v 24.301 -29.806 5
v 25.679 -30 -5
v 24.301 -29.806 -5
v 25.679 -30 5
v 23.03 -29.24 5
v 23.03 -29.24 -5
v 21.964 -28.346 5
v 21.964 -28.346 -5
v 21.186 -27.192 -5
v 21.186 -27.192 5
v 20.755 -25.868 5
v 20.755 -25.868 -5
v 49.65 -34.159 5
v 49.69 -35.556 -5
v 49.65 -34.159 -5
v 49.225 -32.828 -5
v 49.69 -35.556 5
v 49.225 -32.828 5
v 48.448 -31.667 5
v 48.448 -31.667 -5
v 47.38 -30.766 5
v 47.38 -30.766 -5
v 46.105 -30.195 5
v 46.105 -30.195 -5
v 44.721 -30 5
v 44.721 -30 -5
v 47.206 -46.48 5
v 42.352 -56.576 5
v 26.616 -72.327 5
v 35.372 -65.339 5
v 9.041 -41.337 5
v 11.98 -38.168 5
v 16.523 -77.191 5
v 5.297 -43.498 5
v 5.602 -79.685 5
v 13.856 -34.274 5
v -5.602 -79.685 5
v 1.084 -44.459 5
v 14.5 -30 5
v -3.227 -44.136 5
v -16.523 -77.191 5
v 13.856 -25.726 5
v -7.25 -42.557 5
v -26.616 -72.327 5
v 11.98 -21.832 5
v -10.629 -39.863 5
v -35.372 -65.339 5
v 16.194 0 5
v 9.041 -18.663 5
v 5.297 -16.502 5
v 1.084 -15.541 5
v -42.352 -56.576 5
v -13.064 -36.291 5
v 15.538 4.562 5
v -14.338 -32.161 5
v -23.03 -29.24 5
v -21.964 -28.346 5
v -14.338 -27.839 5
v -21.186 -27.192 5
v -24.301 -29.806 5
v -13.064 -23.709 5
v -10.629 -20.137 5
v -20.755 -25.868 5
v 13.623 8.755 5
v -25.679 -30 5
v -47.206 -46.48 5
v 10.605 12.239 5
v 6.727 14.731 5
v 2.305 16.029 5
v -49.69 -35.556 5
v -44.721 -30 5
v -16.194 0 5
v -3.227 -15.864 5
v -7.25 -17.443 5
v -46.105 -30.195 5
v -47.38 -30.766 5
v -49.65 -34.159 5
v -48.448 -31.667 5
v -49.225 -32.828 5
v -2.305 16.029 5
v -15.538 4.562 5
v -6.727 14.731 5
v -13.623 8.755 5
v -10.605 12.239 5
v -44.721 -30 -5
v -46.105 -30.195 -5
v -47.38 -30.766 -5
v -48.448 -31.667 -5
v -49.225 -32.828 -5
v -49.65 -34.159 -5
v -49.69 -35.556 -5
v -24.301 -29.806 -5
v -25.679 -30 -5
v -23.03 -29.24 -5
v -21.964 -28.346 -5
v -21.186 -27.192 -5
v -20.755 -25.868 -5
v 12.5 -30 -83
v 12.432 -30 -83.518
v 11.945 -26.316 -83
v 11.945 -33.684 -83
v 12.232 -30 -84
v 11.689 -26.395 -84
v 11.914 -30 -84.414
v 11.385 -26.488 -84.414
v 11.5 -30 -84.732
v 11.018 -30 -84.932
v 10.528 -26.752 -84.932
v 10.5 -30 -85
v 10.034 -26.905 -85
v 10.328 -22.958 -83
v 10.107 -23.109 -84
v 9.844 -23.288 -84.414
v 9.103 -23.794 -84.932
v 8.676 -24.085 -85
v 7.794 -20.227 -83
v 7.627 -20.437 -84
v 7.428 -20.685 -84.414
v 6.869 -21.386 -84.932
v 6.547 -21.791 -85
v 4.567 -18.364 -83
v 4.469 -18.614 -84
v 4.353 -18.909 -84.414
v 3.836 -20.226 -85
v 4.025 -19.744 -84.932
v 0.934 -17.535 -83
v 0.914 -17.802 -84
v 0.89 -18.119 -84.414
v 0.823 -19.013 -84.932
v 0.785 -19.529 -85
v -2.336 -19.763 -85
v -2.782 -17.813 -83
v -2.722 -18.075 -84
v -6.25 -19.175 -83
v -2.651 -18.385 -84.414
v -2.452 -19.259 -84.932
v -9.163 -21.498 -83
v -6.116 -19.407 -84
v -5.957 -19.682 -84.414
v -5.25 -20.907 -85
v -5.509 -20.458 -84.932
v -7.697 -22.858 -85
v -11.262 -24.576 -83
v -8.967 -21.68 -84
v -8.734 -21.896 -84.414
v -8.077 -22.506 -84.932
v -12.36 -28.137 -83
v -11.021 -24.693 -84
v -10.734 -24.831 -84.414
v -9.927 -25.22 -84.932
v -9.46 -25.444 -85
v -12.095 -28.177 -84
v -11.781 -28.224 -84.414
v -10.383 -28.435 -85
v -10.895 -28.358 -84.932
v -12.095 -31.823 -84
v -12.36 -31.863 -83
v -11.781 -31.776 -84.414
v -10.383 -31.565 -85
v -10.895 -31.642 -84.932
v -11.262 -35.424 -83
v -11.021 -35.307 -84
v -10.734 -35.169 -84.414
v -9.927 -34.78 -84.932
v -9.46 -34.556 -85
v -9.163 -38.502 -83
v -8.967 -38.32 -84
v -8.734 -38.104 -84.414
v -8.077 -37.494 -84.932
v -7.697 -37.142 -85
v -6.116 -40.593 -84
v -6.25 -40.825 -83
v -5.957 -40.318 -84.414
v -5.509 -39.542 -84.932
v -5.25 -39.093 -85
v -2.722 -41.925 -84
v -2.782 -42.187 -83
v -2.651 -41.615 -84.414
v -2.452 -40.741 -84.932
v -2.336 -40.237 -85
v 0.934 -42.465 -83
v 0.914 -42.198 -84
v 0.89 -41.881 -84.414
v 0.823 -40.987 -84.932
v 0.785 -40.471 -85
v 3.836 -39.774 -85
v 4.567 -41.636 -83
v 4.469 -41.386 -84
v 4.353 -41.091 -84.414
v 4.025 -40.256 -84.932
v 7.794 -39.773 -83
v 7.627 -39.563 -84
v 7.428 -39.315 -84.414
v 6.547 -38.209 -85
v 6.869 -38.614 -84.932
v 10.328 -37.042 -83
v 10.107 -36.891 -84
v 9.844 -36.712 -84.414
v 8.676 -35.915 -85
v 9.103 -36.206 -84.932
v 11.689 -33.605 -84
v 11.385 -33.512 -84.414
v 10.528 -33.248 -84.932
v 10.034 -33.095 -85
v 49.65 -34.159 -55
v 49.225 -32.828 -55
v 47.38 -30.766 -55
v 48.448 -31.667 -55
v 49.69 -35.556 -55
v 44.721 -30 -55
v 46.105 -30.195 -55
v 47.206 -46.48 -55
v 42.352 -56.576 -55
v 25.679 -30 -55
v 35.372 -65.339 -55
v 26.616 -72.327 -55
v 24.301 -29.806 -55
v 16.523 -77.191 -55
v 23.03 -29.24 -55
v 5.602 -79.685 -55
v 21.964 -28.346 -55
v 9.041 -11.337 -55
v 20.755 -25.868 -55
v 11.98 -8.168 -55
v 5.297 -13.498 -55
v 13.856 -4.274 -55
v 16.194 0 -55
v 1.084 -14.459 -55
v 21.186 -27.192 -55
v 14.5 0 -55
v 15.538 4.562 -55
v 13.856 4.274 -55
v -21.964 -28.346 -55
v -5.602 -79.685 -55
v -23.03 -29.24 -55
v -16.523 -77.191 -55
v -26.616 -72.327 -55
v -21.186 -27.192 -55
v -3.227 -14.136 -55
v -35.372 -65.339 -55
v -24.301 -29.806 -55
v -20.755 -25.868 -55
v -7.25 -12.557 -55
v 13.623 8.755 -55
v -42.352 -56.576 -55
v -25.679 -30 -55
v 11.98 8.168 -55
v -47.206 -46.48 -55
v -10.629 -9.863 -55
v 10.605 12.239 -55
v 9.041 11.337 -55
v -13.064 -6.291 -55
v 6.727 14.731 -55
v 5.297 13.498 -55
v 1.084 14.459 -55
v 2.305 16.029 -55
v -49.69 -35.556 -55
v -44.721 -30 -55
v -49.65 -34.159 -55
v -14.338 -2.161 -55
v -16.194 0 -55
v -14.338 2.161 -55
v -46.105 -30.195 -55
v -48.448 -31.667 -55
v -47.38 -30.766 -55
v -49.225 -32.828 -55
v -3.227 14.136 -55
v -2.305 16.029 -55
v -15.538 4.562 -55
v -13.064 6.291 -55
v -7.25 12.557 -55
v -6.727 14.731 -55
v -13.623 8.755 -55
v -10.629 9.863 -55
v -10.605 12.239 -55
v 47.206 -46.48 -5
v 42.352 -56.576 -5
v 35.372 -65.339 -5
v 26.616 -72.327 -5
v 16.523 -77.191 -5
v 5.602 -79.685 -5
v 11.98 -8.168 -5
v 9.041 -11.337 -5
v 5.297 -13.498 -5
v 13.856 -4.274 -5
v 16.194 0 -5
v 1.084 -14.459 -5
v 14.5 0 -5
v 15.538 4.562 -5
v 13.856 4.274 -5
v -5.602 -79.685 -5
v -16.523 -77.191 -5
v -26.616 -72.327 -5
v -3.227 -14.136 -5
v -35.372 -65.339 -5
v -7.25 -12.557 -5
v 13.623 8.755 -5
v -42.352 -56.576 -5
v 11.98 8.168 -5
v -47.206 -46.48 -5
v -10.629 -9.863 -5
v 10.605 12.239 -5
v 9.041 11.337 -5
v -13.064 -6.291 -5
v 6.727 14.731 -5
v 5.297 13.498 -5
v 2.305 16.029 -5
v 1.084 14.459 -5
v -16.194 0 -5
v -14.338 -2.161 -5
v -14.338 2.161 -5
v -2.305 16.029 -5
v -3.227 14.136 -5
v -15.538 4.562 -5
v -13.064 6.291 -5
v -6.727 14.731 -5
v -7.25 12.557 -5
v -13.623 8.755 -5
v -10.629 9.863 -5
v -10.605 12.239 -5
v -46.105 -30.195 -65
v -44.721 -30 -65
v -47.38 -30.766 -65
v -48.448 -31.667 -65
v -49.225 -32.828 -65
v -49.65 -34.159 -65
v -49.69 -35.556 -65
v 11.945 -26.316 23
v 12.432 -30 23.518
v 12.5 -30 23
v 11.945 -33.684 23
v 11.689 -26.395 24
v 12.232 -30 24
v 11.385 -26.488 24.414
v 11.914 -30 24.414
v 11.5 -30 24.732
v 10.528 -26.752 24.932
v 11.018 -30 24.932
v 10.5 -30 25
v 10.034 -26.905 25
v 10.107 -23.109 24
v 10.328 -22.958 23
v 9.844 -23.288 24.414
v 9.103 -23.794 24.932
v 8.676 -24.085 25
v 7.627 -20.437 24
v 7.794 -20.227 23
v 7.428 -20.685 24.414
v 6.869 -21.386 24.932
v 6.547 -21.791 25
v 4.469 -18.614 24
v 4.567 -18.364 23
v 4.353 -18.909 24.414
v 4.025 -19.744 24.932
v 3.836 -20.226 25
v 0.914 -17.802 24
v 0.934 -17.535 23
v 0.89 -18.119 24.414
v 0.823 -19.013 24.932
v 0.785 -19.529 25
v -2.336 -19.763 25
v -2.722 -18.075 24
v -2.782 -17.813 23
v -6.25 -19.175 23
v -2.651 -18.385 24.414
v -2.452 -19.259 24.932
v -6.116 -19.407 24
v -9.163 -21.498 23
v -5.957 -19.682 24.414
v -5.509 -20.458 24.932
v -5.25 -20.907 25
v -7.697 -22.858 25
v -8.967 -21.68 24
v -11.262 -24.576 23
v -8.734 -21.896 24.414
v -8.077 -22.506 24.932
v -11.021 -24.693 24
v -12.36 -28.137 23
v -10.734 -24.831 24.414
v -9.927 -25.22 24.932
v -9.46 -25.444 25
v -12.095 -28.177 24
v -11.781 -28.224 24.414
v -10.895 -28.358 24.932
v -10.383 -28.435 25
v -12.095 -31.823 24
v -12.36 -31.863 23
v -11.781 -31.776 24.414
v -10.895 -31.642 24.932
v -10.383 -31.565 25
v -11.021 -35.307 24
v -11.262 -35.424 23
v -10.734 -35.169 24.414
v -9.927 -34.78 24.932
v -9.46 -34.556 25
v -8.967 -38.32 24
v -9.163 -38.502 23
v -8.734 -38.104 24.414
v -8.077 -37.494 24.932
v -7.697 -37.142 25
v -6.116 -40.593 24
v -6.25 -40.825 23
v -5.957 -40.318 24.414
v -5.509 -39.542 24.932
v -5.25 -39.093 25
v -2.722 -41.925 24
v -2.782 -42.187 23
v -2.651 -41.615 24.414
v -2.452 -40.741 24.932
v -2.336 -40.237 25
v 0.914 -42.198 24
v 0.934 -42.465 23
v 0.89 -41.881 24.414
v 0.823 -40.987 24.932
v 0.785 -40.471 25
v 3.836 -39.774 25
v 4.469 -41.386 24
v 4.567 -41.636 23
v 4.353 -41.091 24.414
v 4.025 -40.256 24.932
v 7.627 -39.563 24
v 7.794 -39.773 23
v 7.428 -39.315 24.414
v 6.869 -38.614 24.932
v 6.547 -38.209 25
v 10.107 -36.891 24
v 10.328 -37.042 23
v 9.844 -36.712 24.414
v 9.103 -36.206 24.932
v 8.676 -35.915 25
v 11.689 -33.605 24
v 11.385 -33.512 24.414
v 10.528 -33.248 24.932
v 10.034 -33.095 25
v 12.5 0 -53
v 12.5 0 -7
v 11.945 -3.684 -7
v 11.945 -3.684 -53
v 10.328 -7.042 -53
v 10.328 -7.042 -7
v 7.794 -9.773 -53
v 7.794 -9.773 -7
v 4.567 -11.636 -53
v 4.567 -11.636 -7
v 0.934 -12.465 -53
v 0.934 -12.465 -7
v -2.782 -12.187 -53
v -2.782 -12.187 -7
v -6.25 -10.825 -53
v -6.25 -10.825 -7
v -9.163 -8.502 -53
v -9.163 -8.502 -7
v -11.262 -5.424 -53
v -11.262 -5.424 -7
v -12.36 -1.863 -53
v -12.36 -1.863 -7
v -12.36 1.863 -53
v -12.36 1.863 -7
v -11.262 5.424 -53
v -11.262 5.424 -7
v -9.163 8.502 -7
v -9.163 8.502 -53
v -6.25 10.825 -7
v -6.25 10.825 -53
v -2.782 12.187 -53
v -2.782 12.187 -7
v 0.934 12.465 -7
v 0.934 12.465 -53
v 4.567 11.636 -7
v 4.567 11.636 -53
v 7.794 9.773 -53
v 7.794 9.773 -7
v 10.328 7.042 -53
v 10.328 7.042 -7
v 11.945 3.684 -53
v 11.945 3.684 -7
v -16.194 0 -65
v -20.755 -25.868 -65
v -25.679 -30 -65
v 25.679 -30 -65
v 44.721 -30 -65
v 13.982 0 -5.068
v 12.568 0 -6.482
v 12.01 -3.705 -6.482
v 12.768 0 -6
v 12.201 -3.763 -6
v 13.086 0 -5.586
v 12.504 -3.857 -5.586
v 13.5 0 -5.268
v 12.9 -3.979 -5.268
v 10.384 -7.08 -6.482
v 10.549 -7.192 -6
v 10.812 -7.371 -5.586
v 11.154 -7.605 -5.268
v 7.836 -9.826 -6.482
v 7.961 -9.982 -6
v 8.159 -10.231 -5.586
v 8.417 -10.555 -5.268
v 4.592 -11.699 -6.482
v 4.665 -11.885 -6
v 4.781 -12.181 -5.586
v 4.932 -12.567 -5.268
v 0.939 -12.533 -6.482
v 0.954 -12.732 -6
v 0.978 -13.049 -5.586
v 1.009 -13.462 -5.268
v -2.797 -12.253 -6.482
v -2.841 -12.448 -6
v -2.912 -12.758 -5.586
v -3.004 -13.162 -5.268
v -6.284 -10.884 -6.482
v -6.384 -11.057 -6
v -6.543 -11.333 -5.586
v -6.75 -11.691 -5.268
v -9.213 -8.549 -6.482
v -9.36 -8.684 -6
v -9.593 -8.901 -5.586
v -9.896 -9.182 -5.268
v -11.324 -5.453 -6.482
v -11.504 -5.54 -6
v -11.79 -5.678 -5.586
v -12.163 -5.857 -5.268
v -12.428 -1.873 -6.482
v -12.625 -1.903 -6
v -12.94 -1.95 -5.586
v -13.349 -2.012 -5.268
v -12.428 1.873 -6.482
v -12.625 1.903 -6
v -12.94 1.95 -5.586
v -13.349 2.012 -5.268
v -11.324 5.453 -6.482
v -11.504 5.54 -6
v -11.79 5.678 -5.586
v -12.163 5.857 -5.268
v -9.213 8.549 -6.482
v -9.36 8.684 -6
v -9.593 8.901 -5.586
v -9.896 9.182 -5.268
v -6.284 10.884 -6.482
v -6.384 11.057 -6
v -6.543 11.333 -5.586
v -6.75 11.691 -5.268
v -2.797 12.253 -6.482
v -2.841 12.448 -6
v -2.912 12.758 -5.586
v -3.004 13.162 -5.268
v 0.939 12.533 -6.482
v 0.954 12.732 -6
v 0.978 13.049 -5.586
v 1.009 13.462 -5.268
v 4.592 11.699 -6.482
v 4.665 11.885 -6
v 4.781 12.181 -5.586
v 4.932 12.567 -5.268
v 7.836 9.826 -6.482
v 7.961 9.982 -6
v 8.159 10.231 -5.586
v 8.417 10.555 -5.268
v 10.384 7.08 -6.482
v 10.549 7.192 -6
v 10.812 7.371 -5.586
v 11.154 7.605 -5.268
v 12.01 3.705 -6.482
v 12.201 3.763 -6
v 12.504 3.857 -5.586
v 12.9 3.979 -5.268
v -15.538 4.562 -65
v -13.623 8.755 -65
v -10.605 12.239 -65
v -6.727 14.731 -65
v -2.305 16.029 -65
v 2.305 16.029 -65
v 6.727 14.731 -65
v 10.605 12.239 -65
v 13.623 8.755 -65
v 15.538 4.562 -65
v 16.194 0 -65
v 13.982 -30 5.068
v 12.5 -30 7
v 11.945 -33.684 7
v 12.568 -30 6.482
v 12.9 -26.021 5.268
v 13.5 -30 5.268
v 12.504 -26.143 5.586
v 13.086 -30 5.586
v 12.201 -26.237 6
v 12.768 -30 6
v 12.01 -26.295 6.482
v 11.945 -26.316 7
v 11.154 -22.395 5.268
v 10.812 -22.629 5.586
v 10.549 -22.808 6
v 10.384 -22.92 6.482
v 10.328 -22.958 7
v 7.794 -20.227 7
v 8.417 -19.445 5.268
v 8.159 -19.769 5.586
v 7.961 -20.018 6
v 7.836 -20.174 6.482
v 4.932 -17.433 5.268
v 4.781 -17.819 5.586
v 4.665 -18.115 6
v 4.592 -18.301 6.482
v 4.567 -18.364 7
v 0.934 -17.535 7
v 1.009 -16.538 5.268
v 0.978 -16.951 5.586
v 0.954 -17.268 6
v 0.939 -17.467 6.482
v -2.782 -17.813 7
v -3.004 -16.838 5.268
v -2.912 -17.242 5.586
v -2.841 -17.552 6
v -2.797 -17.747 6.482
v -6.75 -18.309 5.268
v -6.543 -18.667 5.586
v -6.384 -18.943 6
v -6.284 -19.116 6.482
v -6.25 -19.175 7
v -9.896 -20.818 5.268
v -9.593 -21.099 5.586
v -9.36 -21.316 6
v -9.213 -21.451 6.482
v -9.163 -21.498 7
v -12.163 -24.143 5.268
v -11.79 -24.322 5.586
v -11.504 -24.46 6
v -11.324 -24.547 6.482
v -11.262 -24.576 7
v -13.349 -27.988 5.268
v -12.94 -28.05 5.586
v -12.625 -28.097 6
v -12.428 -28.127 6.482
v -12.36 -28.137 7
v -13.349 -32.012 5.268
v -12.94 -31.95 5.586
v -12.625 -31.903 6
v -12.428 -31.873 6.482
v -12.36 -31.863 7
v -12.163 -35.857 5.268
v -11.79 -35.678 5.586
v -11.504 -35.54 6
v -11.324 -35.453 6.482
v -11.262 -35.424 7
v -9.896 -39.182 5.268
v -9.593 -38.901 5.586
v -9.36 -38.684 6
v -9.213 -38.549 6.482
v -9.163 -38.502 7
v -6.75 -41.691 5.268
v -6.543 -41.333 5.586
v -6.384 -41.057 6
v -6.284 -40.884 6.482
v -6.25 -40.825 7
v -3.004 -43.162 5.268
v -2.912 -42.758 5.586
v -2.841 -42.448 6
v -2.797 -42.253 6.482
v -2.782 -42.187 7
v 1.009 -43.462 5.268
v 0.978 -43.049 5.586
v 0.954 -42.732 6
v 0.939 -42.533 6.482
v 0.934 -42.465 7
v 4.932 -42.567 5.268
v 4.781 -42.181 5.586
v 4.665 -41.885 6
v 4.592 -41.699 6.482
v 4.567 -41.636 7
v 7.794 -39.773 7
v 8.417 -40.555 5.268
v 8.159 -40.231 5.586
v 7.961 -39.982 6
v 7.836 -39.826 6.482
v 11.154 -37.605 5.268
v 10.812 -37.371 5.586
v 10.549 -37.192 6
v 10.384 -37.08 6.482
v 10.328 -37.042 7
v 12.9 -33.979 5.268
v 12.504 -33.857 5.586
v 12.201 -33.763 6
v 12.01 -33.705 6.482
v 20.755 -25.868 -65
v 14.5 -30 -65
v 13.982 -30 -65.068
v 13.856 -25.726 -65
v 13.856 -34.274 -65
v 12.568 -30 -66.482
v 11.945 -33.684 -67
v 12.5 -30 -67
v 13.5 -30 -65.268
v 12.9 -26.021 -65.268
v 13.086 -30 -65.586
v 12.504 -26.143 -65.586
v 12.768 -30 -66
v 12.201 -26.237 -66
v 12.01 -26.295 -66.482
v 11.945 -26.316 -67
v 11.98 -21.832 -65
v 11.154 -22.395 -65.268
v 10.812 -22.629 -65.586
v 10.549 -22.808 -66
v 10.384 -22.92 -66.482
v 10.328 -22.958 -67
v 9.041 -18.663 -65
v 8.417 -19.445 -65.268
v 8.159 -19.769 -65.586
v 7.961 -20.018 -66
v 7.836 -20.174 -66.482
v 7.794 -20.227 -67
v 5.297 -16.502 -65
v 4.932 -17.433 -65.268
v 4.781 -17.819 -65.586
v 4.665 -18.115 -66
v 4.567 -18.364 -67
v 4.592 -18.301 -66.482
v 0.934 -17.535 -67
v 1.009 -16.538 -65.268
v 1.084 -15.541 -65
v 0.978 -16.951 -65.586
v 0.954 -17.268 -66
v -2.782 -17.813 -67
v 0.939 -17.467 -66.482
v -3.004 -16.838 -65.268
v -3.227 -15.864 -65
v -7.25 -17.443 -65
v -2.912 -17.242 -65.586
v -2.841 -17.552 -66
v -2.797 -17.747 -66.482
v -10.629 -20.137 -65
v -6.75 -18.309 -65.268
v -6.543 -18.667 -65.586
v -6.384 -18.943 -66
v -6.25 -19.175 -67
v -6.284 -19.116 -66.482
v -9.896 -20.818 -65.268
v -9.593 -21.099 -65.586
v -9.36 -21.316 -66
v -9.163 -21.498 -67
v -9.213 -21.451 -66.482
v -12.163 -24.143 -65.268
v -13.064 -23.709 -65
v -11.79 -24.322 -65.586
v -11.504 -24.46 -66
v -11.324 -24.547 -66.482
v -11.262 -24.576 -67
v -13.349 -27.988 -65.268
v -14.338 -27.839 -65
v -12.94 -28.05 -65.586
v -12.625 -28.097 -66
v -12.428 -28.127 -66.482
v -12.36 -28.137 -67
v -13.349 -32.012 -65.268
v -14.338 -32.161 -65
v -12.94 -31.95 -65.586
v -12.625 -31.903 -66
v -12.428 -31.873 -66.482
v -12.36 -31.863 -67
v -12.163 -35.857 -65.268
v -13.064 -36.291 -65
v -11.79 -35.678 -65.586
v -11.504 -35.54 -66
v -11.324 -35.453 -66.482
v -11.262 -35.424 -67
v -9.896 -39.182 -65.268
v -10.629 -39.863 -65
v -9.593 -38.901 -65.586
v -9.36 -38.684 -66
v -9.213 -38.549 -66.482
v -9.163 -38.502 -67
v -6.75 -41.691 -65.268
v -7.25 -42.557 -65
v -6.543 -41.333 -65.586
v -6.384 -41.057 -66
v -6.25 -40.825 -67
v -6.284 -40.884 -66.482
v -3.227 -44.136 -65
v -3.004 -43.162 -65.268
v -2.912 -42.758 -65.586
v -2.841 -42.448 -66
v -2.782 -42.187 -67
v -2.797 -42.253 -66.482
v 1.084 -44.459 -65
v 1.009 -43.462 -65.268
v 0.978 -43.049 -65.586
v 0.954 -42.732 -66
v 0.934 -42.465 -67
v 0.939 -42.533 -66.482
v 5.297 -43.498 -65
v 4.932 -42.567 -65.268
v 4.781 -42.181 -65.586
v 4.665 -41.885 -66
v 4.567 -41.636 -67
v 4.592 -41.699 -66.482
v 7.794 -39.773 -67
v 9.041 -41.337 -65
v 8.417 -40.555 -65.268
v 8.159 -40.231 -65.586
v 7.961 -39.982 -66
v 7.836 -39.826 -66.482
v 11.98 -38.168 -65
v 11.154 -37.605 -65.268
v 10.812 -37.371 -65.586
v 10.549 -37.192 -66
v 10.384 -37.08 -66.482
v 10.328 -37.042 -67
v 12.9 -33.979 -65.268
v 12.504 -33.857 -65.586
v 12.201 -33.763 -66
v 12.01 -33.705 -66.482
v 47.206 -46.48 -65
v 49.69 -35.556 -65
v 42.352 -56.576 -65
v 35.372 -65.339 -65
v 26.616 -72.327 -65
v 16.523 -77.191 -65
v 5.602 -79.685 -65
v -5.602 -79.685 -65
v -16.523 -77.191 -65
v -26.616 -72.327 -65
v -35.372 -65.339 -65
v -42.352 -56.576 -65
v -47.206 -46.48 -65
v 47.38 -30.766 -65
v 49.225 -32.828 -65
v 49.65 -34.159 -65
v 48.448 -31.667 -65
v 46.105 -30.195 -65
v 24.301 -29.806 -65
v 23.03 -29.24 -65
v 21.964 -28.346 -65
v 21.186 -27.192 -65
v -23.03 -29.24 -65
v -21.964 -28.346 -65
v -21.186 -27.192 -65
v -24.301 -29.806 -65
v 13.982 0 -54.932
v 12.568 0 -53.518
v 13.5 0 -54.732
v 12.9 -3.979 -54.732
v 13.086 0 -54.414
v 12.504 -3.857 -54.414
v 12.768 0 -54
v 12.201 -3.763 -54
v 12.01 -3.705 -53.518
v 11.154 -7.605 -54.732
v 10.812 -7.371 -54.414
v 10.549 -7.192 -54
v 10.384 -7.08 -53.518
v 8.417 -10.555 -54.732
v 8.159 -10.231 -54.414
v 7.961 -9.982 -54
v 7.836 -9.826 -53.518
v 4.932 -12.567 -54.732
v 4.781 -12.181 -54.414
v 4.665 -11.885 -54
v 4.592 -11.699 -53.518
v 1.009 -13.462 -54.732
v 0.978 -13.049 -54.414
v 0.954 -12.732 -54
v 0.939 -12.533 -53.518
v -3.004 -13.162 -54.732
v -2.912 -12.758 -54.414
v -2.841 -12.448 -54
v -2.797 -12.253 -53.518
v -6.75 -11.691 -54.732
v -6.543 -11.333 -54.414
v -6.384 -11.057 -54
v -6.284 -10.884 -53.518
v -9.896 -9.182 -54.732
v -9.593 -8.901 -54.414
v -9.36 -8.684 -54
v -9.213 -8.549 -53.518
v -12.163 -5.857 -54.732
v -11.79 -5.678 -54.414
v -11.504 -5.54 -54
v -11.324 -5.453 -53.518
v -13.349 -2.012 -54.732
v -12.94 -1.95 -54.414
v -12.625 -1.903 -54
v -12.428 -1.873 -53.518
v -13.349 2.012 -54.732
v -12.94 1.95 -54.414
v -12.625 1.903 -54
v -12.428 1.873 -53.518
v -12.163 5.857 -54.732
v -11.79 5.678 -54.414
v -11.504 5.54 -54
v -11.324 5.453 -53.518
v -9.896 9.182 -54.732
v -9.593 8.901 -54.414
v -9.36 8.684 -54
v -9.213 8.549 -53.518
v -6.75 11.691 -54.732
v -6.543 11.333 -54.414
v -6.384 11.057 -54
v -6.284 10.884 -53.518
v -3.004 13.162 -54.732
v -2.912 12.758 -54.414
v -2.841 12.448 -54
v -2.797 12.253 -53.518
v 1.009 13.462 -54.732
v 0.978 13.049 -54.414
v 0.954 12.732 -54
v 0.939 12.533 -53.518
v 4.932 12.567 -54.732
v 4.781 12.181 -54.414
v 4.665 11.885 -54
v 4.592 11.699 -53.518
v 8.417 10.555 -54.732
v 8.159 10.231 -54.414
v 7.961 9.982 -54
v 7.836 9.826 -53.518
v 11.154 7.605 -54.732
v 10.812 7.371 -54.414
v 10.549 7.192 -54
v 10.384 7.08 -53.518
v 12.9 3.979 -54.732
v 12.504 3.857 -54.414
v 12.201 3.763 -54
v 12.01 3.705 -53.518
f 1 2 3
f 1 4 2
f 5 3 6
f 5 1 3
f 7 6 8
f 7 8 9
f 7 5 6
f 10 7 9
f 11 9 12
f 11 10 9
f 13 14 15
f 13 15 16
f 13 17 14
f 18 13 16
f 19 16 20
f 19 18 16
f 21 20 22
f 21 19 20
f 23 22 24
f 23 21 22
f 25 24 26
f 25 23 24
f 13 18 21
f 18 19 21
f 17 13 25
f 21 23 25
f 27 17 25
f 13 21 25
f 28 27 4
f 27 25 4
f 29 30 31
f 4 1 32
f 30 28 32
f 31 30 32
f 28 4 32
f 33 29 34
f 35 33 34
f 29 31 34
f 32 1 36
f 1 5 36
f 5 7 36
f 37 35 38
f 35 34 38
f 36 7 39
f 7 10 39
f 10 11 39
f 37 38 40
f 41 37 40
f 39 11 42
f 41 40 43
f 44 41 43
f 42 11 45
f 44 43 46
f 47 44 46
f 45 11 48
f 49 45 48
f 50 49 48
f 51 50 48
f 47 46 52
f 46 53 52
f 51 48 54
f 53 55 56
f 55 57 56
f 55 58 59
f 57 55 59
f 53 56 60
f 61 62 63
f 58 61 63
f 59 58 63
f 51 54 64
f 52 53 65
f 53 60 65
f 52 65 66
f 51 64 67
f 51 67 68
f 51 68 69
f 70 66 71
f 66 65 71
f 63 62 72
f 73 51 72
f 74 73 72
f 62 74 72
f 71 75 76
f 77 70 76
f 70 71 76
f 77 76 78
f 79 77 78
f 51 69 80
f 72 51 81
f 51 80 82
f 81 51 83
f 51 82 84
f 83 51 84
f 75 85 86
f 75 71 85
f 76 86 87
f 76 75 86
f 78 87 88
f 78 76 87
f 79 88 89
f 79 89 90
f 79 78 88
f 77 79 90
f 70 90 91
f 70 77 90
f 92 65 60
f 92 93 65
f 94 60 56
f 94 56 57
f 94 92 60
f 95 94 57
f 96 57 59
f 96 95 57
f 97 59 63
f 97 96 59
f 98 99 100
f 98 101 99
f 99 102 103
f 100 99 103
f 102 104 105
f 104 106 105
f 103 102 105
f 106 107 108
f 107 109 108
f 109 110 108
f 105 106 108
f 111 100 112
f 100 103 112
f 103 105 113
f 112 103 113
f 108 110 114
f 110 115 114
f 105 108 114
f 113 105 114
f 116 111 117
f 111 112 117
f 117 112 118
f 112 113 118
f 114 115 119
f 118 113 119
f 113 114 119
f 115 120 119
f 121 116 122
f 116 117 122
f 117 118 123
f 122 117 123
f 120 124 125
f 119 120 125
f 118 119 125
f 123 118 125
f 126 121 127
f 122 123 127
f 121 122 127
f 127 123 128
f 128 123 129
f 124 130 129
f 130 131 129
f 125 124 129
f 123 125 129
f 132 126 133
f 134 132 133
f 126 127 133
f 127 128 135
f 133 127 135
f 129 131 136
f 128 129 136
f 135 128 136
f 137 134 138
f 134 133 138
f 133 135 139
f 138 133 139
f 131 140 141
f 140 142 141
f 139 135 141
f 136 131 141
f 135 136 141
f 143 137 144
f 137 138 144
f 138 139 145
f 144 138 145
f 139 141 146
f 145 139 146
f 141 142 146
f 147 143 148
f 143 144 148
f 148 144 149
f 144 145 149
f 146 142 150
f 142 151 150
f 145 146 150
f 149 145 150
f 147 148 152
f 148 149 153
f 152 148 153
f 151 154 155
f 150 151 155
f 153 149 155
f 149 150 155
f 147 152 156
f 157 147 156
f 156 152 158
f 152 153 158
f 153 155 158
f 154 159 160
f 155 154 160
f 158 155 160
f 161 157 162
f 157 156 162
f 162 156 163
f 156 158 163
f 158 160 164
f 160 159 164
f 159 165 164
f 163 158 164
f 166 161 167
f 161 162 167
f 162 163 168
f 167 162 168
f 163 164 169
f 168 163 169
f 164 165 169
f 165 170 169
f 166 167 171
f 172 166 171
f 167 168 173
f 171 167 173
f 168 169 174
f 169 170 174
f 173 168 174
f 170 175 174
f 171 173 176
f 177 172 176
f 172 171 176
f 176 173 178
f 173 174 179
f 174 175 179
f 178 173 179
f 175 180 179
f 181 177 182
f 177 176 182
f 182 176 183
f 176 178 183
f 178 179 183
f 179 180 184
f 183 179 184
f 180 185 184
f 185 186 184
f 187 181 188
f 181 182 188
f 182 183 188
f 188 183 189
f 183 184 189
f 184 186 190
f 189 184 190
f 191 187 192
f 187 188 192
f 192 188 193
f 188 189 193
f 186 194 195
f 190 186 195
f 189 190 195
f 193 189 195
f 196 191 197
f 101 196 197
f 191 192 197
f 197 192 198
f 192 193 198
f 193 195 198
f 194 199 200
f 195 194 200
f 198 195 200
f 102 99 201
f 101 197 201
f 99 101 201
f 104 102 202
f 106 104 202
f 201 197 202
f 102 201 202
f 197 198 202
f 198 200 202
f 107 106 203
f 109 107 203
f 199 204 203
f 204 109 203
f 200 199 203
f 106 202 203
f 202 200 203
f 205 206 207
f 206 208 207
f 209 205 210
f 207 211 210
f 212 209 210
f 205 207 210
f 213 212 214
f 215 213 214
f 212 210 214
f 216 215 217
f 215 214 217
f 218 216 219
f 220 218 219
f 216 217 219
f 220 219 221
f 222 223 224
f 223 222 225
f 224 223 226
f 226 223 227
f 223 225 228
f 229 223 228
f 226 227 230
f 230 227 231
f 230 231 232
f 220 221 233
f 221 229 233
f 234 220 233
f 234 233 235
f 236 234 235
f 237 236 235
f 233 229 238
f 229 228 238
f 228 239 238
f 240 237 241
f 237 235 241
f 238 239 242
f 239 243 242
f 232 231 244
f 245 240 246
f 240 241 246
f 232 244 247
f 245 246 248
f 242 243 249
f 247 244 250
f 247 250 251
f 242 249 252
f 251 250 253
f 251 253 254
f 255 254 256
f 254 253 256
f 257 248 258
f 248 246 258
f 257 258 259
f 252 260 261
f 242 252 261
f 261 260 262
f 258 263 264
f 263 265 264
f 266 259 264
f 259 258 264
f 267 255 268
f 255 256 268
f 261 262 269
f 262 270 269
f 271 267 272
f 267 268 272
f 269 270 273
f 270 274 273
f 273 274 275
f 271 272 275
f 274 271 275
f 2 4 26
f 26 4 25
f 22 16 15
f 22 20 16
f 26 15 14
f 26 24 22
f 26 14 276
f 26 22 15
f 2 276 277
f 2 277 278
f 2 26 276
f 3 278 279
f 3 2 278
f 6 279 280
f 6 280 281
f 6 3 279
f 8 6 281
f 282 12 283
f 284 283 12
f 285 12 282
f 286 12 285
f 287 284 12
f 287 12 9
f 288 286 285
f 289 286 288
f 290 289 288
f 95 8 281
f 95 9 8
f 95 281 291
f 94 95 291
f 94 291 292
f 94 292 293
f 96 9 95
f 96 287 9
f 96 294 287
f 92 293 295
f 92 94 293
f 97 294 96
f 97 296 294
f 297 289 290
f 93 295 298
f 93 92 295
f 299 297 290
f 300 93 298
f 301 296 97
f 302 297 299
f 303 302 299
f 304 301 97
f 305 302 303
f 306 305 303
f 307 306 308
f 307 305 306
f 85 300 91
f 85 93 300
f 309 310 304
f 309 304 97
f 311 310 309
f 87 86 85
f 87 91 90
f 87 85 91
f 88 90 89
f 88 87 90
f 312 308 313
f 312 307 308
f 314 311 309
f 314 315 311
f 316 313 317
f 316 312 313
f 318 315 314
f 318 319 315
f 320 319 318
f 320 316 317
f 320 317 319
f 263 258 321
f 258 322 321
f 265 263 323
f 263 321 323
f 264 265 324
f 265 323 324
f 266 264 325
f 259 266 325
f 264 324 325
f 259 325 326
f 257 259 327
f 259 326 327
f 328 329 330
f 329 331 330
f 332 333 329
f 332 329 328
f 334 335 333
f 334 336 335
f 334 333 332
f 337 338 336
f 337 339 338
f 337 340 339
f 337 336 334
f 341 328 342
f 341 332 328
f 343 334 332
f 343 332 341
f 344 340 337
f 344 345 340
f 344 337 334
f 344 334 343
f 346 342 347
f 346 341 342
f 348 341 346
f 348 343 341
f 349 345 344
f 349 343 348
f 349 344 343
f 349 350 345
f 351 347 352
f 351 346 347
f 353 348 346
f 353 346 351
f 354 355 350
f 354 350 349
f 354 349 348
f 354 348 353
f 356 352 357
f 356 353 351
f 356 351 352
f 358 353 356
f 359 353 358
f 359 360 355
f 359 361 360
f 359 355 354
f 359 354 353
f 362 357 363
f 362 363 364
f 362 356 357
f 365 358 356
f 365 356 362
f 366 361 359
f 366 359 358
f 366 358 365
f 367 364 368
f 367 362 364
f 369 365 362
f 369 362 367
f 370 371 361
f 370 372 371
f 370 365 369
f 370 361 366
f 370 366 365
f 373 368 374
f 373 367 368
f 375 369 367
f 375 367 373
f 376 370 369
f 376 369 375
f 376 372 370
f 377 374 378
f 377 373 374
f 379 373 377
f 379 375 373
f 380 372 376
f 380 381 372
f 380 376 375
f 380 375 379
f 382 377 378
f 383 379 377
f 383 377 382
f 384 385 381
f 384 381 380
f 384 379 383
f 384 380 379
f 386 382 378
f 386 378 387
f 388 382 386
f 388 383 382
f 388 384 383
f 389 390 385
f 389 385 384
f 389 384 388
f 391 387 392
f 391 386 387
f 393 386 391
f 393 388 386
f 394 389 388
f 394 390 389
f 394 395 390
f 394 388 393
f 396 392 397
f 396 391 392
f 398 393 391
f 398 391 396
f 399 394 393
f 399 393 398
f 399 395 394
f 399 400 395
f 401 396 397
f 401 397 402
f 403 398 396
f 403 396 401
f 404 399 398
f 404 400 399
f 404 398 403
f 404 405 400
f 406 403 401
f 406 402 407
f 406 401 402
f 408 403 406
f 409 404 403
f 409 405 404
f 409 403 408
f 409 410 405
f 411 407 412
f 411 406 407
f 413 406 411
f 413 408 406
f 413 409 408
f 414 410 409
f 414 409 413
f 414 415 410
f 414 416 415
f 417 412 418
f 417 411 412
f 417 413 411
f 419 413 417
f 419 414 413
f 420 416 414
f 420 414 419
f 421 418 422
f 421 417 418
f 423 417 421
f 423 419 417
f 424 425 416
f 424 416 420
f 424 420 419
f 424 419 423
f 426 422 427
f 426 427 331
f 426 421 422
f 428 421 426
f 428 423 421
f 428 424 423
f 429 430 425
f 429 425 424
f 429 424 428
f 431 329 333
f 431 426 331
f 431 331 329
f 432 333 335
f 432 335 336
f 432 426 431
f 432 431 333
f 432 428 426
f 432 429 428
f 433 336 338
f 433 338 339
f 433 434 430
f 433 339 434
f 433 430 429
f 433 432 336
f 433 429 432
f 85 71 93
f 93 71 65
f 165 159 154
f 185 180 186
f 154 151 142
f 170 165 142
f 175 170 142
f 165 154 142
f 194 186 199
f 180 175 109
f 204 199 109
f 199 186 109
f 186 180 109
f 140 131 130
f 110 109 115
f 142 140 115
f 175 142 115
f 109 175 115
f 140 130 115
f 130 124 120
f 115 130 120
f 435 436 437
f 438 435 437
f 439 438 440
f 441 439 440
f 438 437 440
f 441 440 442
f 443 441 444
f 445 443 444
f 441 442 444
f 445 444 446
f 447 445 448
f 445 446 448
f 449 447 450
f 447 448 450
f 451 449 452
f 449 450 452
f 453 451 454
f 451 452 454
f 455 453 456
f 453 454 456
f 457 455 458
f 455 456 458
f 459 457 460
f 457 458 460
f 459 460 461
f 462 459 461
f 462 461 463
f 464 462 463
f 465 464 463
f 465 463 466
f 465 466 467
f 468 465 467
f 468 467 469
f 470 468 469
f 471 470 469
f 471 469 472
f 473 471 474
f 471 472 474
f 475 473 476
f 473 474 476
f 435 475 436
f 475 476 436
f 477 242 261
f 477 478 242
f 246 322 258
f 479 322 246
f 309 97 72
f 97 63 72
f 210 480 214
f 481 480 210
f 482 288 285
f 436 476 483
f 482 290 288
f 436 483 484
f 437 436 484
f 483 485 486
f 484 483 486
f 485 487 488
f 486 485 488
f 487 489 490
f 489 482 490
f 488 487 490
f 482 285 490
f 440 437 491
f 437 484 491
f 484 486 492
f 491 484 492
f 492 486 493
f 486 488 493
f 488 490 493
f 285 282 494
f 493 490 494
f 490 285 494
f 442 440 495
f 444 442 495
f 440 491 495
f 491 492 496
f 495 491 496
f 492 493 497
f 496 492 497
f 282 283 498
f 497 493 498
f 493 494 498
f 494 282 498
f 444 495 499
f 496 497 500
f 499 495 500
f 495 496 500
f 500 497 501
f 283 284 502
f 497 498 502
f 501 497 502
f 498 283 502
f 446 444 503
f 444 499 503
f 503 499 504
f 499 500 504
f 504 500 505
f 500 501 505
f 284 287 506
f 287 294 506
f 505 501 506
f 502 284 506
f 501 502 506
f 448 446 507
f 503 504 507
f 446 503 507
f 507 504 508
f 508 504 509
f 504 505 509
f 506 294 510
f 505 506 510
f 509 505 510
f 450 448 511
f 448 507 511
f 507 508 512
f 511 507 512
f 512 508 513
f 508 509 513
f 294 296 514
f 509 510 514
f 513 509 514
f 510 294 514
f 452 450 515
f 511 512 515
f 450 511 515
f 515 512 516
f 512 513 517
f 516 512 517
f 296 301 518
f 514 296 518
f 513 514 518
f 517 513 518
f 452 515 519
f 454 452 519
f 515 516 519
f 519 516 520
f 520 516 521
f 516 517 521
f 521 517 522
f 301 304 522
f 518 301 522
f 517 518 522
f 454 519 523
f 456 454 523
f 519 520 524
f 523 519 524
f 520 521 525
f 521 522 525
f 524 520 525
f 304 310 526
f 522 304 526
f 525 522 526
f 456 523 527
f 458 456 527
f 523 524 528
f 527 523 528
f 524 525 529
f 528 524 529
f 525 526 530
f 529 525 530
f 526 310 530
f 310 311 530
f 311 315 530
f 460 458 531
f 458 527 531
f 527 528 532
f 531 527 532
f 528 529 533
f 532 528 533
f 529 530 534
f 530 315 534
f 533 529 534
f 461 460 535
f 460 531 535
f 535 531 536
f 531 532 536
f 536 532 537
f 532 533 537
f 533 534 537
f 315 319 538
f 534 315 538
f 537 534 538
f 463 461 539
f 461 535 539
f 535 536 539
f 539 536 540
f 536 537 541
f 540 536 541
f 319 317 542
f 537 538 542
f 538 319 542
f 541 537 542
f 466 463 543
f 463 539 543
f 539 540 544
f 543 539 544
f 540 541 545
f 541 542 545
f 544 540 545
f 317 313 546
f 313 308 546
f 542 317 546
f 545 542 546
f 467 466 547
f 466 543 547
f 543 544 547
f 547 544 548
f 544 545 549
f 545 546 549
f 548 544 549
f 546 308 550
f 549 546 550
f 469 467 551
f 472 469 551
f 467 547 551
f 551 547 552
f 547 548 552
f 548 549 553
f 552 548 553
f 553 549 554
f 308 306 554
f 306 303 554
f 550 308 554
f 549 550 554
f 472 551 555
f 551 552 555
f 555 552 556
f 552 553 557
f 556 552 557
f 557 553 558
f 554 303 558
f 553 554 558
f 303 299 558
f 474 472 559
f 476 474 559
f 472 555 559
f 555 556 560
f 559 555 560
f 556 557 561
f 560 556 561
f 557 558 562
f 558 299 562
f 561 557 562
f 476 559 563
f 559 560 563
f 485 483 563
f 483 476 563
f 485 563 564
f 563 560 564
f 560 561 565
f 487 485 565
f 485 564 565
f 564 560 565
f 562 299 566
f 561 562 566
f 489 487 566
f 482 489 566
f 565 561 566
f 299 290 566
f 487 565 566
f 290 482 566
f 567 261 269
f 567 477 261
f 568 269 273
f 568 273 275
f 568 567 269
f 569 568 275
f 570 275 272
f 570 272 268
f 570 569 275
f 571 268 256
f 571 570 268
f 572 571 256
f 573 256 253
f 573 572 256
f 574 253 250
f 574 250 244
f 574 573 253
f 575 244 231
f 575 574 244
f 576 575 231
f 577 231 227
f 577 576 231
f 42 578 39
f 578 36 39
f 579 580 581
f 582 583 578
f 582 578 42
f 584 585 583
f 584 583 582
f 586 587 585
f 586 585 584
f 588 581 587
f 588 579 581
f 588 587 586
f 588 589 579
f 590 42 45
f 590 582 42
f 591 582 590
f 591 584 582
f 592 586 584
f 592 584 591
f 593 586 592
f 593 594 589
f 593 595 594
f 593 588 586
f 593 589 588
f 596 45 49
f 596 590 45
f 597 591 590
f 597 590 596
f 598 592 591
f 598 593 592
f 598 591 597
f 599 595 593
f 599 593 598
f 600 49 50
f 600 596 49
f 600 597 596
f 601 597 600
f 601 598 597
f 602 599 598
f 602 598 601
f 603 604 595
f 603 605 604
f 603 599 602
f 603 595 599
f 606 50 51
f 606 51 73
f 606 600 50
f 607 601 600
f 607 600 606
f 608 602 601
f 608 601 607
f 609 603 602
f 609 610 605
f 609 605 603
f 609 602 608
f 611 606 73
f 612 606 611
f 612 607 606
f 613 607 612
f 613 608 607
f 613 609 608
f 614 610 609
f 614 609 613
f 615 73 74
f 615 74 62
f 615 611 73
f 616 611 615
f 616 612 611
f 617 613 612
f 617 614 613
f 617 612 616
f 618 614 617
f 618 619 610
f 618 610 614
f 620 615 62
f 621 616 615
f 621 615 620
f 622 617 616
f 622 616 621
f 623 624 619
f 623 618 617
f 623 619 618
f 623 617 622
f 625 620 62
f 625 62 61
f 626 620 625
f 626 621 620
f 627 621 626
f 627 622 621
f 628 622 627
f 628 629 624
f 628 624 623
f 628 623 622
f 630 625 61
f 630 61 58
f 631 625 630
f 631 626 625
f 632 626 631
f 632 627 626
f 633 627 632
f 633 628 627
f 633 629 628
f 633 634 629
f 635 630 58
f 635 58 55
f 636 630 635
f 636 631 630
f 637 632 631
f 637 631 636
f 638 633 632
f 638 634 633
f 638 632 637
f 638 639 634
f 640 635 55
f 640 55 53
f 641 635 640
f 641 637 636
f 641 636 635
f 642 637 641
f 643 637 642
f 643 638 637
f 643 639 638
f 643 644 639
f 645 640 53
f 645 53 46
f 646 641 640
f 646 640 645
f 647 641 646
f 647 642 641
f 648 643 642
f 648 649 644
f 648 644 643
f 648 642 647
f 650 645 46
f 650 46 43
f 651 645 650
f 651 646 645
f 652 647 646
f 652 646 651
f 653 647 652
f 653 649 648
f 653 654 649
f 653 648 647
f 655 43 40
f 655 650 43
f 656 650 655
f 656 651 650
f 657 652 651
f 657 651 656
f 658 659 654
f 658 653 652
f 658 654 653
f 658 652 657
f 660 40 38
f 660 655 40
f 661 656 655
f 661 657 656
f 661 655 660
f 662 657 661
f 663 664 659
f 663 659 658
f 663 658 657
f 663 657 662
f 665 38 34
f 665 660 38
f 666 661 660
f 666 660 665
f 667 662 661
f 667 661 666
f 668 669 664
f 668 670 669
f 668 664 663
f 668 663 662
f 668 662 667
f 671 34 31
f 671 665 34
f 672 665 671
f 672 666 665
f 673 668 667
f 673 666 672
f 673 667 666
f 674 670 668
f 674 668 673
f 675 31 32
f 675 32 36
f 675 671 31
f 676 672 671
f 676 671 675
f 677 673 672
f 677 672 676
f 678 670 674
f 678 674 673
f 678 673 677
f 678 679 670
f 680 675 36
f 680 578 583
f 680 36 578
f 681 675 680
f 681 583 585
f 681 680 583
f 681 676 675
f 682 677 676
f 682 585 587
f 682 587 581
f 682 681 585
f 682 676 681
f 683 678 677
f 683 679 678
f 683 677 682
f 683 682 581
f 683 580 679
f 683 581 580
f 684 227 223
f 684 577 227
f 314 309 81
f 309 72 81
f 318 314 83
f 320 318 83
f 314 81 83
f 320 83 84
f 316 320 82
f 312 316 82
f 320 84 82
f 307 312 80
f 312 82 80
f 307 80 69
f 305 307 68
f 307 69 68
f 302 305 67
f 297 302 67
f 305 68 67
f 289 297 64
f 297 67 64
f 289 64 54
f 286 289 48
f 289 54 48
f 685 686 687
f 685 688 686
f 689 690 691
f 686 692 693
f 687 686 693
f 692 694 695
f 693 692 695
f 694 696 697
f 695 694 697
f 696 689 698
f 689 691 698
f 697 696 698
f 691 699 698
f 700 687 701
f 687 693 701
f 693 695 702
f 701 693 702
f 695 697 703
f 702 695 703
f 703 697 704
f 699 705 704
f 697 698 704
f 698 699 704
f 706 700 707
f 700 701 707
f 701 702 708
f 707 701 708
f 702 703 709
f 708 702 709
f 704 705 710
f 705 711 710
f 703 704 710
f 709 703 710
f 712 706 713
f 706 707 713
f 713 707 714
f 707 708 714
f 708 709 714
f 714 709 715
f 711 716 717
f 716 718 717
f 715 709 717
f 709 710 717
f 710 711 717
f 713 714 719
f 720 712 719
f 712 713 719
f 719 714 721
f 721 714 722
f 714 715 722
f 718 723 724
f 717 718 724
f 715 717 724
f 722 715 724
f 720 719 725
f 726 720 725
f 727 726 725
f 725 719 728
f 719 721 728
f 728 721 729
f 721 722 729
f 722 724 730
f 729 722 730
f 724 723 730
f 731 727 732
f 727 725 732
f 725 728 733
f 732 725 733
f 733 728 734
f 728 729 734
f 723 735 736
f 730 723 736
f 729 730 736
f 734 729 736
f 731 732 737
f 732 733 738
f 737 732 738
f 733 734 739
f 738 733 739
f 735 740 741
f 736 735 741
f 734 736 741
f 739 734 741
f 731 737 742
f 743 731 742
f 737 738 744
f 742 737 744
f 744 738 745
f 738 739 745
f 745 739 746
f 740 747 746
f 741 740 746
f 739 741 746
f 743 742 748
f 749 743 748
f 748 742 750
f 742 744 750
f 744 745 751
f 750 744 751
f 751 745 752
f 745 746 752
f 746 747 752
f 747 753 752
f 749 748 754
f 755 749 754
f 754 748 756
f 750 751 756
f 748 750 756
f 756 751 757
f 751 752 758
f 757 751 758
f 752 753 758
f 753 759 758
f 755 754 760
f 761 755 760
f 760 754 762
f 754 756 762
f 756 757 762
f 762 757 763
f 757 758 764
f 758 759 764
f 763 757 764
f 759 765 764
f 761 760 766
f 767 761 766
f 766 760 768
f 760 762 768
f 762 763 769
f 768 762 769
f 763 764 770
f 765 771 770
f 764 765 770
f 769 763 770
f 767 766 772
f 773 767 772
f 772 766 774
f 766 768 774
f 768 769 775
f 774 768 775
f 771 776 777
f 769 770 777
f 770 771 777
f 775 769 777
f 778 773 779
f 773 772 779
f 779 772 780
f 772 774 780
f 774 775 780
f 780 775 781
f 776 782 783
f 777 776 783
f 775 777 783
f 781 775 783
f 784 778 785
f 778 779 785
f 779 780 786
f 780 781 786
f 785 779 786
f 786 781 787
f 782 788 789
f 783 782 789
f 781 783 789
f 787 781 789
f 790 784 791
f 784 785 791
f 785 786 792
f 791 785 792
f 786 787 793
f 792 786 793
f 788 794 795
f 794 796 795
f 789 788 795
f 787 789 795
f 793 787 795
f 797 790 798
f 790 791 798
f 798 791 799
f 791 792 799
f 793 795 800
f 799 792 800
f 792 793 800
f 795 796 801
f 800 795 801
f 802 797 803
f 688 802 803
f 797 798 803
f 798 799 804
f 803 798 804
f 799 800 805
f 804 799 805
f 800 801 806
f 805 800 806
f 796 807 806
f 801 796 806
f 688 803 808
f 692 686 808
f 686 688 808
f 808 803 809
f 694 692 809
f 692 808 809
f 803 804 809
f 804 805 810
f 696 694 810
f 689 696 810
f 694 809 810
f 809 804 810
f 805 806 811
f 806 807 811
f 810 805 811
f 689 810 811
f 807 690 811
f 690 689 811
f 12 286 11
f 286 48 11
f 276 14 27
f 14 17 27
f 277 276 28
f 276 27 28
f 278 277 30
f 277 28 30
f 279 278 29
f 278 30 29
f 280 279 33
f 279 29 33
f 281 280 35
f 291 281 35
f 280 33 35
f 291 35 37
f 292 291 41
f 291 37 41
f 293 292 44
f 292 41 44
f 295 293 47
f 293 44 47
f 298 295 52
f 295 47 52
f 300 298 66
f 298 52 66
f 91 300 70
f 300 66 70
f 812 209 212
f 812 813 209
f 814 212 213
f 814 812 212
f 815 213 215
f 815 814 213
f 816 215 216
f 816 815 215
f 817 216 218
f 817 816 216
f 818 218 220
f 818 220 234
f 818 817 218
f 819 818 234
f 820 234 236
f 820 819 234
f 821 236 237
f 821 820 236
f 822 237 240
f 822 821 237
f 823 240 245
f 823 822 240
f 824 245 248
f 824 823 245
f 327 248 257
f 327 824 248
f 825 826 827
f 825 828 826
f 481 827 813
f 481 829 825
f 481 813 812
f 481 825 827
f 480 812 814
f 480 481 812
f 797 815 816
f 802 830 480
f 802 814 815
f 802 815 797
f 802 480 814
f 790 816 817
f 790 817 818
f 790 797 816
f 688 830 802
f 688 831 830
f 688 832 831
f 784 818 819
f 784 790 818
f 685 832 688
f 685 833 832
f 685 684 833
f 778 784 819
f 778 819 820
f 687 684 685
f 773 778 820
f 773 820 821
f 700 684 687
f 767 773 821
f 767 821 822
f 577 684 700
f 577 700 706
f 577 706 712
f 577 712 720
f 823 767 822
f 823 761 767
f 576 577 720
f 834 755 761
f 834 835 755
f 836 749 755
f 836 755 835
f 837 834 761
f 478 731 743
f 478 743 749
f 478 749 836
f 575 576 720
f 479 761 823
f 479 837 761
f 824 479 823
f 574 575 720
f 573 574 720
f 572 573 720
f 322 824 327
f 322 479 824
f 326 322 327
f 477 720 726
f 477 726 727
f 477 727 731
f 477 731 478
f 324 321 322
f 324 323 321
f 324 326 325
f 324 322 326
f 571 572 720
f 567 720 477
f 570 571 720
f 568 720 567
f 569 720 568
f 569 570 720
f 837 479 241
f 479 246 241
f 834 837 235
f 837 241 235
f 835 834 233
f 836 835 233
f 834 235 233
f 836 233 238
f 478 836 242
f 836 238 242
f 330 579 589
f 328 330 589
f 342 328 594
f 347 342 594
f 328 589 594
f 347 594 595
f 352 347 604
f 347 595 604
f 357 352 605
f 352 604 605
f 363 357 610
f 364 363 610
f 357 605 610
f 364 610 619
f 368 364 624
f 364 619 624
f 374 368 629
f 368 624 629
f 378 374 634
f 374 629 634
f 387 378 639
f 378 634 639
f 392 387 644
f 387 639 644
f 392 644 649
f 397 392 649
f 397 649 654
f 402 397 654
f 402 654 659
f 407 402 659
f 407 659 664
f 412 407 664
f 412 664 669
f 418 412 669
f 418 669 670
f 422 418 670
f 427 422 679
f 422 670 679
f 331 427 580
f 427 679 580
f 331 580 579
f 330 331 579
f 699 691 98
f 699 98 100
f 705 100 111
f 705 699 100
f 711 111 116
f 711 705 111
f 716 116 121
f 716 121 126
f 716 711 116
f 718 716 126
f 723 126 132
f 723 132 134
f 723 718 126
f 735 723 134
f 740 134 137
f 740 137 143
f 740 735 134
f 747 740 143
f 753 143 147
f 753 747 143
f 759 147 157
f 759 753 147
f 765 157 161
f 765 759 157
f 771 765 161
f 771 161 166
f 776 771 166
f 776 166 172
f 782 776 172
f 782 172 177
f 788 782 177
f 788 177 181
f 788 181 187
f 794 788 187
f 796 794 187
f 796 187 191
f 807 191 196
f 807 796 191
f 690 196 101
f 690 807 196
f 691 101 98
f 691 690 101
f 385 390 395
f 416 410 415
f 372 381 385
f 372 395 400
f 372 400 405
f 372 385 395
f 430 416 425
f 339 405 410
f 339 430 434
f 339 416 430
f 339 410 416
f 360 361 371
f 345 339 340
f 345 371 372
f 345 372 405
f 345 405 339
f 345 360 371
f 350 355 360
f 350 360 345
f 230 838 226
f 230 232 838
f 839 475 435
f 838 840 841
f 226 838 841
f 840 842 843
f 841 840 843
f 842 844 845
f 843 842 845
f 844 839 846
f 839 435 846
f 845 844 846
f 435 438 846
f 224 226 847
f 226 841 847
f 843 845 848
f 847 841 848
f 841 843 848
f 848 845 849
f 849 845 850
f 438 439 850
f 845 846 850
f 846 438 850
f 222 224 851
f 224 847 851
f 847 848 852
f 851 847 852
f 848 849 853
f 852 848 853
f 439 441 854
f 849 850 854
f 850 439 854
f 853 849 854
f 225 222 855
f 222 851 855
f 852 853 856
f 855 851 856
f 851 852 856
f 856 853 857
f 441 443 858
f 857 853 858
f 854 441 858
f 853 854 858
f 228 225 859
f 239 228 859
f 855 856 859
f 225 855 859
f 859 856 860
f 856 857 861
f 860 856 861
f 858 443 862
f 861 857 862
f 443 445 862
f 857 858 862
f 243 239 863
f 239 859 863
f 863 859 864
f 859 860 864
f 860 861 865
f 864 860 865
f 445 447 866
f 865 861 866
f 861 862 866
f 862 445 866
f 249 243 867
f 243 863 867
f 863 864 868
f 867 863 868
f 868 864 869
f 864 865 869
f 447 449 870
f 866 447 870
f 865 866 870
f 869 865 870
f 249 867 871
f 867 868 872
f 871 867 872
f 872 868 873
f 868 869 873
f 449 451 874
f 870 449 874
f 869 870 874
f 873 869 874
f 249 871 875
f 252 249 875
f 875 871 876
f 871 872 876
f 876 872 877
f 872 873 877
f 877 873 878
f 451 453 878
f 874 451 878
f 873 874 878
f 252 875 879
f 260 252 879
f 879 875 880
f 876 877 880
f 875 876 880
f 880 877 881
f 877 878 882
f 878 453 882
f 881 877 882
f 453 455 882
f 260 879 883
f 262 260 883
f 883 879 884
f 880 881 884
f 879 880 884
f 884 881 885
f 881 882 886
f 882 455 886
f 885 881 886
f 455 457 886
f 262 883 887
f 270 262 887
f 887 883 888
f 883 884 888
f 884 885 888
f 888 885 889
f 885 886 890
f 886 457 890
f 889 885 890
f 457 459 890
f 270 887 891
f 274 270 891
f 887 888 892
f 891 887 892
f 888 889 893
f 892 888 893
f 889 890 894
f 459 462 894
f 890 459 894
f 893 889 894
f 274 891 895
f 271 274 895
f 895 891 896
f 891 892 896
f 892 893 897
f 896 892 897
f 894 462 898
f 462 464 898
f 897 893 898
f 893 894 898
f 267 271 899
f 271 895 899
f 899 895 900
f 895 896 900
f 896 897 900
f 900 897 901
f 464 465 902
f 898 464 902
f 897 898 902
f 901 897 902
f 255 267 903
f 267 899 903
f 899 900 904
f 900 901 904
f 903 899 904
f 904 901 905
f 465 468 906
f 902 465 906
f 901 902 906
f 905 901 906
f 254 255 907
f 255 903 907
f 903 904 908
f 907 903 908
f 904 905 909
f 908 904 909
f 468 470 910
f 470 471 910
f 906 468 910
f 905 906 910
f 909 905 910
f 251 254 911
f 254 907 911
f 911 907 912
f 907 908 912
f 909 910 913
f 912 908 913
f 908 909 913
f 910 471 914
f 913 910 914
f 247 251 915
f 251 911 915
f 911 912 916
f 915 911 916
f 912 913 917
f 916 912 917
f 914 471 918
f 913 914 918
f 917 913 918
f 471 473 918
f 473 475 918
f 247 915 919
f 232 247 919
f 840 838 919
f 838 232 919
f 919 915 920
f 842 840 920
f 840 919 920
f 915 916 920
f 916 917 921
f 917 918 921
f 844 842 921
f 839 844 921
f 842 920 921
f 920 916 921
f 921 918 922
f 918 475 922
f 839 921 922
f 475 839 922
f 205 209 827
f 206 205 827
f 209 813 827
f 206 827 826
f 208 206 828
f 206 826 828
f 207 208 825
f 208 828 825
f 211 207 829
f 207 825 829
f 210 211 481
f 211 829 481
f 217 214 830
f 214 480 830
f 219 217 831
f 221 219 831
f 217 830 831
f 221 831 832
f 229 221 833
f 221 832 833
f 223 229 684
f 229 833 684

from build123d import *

# Parameters (mm, degrees)
BOSS_EXTRUDE1_DEPTH = 5
SKETCH2_R           = 12.5
BOSS_EXTRUDE2_DEPTH = 20
SKETCH3_R           = 12.5
BOSS_EXTRUDE3_DEPTH = 50
FILLET2_R           = 5
FILLET3_R           = 2


with BuildPart() as part:
    # Sketch1 → Boss-Extrude1 (new, symmetric)
    with BuildSketch(Plane.XY):
        with BuildLine():
            Line((-50, -30), (-21.483978407, -30))
            Line((-21.483978407, -30), (-16.194168986, 0))
            ThreePointArc((-16.194168986, 0), (0, 16.194168986), (16.194168986, 0))
            Line((16.194168986, 0), (21.483978407, -30))
            Line((21.483978407, -30), (50, -30))
            ThreePointArc((50, -30), (0, -80), (-50, -30))
        make_face()
    boss_extrude1 = extrude(amount=BOSS_EXTRUDE1_DEPTH, both=True)

    # Sketch2 → Boss-Extrude2 (add)
    with BuildSketch(Plane.XY.offset(5)):
        with Locations((0, -30)):
            Circle(SKETCH2_R)
    boss_extrude2 = extrude(amount=BOSS_EXTRUDE2_DEPTH)

    # Sketch3 → Boss-Extrude3 (add)
    with BuildSketch(Plane(origin=(0, 0, -5), x_dir=(-1, 0, 0), z_dir=(0, 0, -1))):
        with Locations(Location((0, 0, 0), (0, 0, 180))):
            Circle(SKETCH3_R)
    extrude(amount=BOSS_EXTRUDE3_DEPTH)

    # Mirror1: Boss-Extrude1, Boss-Extrude2 across plane
    add(boss_extrude1.mirror(Plane(origin=(0, 0, -30), x_dir=(1, 0, 0), z_dir=(0, 0, -1))))
    add(boss_extrude2.mirror(Plane(origin=(0, 0, -30), x_dir=(1, 0, 0), z_dir=(0, 0, -1))))

    # Fillet2
    fillet2_edges = [part.edges().sort_by_distance(p)[0] for p in [
        (21.483978407, -30, 0),
        (50, -30, 0),
        (-50, -30, 0),
        (-21.483978407, -30, 0),
        (21.483978407, -30, -60),
        (50, -30, -60),
        (-50, -30, -60),
        (-21.483978407, -30, -60),
    ]]
    fillet(fillet2_edges, radius=FILLET2_R)

    # Fillet3
    fillet3_edges = [part.edges().sort_by_distance(p)[0] for p in [
        (-12.5, -30, 5),
        (-12.5, -30, 25),
        (-12.5, 0, -5),
        (-12.5, 0, -55),
        (-12.5, -30, -65),
        (-12.5, -30, -85),
    ]]
    fillet(fillet3_edges, radius=FILLET3_R)


solid = part.part
